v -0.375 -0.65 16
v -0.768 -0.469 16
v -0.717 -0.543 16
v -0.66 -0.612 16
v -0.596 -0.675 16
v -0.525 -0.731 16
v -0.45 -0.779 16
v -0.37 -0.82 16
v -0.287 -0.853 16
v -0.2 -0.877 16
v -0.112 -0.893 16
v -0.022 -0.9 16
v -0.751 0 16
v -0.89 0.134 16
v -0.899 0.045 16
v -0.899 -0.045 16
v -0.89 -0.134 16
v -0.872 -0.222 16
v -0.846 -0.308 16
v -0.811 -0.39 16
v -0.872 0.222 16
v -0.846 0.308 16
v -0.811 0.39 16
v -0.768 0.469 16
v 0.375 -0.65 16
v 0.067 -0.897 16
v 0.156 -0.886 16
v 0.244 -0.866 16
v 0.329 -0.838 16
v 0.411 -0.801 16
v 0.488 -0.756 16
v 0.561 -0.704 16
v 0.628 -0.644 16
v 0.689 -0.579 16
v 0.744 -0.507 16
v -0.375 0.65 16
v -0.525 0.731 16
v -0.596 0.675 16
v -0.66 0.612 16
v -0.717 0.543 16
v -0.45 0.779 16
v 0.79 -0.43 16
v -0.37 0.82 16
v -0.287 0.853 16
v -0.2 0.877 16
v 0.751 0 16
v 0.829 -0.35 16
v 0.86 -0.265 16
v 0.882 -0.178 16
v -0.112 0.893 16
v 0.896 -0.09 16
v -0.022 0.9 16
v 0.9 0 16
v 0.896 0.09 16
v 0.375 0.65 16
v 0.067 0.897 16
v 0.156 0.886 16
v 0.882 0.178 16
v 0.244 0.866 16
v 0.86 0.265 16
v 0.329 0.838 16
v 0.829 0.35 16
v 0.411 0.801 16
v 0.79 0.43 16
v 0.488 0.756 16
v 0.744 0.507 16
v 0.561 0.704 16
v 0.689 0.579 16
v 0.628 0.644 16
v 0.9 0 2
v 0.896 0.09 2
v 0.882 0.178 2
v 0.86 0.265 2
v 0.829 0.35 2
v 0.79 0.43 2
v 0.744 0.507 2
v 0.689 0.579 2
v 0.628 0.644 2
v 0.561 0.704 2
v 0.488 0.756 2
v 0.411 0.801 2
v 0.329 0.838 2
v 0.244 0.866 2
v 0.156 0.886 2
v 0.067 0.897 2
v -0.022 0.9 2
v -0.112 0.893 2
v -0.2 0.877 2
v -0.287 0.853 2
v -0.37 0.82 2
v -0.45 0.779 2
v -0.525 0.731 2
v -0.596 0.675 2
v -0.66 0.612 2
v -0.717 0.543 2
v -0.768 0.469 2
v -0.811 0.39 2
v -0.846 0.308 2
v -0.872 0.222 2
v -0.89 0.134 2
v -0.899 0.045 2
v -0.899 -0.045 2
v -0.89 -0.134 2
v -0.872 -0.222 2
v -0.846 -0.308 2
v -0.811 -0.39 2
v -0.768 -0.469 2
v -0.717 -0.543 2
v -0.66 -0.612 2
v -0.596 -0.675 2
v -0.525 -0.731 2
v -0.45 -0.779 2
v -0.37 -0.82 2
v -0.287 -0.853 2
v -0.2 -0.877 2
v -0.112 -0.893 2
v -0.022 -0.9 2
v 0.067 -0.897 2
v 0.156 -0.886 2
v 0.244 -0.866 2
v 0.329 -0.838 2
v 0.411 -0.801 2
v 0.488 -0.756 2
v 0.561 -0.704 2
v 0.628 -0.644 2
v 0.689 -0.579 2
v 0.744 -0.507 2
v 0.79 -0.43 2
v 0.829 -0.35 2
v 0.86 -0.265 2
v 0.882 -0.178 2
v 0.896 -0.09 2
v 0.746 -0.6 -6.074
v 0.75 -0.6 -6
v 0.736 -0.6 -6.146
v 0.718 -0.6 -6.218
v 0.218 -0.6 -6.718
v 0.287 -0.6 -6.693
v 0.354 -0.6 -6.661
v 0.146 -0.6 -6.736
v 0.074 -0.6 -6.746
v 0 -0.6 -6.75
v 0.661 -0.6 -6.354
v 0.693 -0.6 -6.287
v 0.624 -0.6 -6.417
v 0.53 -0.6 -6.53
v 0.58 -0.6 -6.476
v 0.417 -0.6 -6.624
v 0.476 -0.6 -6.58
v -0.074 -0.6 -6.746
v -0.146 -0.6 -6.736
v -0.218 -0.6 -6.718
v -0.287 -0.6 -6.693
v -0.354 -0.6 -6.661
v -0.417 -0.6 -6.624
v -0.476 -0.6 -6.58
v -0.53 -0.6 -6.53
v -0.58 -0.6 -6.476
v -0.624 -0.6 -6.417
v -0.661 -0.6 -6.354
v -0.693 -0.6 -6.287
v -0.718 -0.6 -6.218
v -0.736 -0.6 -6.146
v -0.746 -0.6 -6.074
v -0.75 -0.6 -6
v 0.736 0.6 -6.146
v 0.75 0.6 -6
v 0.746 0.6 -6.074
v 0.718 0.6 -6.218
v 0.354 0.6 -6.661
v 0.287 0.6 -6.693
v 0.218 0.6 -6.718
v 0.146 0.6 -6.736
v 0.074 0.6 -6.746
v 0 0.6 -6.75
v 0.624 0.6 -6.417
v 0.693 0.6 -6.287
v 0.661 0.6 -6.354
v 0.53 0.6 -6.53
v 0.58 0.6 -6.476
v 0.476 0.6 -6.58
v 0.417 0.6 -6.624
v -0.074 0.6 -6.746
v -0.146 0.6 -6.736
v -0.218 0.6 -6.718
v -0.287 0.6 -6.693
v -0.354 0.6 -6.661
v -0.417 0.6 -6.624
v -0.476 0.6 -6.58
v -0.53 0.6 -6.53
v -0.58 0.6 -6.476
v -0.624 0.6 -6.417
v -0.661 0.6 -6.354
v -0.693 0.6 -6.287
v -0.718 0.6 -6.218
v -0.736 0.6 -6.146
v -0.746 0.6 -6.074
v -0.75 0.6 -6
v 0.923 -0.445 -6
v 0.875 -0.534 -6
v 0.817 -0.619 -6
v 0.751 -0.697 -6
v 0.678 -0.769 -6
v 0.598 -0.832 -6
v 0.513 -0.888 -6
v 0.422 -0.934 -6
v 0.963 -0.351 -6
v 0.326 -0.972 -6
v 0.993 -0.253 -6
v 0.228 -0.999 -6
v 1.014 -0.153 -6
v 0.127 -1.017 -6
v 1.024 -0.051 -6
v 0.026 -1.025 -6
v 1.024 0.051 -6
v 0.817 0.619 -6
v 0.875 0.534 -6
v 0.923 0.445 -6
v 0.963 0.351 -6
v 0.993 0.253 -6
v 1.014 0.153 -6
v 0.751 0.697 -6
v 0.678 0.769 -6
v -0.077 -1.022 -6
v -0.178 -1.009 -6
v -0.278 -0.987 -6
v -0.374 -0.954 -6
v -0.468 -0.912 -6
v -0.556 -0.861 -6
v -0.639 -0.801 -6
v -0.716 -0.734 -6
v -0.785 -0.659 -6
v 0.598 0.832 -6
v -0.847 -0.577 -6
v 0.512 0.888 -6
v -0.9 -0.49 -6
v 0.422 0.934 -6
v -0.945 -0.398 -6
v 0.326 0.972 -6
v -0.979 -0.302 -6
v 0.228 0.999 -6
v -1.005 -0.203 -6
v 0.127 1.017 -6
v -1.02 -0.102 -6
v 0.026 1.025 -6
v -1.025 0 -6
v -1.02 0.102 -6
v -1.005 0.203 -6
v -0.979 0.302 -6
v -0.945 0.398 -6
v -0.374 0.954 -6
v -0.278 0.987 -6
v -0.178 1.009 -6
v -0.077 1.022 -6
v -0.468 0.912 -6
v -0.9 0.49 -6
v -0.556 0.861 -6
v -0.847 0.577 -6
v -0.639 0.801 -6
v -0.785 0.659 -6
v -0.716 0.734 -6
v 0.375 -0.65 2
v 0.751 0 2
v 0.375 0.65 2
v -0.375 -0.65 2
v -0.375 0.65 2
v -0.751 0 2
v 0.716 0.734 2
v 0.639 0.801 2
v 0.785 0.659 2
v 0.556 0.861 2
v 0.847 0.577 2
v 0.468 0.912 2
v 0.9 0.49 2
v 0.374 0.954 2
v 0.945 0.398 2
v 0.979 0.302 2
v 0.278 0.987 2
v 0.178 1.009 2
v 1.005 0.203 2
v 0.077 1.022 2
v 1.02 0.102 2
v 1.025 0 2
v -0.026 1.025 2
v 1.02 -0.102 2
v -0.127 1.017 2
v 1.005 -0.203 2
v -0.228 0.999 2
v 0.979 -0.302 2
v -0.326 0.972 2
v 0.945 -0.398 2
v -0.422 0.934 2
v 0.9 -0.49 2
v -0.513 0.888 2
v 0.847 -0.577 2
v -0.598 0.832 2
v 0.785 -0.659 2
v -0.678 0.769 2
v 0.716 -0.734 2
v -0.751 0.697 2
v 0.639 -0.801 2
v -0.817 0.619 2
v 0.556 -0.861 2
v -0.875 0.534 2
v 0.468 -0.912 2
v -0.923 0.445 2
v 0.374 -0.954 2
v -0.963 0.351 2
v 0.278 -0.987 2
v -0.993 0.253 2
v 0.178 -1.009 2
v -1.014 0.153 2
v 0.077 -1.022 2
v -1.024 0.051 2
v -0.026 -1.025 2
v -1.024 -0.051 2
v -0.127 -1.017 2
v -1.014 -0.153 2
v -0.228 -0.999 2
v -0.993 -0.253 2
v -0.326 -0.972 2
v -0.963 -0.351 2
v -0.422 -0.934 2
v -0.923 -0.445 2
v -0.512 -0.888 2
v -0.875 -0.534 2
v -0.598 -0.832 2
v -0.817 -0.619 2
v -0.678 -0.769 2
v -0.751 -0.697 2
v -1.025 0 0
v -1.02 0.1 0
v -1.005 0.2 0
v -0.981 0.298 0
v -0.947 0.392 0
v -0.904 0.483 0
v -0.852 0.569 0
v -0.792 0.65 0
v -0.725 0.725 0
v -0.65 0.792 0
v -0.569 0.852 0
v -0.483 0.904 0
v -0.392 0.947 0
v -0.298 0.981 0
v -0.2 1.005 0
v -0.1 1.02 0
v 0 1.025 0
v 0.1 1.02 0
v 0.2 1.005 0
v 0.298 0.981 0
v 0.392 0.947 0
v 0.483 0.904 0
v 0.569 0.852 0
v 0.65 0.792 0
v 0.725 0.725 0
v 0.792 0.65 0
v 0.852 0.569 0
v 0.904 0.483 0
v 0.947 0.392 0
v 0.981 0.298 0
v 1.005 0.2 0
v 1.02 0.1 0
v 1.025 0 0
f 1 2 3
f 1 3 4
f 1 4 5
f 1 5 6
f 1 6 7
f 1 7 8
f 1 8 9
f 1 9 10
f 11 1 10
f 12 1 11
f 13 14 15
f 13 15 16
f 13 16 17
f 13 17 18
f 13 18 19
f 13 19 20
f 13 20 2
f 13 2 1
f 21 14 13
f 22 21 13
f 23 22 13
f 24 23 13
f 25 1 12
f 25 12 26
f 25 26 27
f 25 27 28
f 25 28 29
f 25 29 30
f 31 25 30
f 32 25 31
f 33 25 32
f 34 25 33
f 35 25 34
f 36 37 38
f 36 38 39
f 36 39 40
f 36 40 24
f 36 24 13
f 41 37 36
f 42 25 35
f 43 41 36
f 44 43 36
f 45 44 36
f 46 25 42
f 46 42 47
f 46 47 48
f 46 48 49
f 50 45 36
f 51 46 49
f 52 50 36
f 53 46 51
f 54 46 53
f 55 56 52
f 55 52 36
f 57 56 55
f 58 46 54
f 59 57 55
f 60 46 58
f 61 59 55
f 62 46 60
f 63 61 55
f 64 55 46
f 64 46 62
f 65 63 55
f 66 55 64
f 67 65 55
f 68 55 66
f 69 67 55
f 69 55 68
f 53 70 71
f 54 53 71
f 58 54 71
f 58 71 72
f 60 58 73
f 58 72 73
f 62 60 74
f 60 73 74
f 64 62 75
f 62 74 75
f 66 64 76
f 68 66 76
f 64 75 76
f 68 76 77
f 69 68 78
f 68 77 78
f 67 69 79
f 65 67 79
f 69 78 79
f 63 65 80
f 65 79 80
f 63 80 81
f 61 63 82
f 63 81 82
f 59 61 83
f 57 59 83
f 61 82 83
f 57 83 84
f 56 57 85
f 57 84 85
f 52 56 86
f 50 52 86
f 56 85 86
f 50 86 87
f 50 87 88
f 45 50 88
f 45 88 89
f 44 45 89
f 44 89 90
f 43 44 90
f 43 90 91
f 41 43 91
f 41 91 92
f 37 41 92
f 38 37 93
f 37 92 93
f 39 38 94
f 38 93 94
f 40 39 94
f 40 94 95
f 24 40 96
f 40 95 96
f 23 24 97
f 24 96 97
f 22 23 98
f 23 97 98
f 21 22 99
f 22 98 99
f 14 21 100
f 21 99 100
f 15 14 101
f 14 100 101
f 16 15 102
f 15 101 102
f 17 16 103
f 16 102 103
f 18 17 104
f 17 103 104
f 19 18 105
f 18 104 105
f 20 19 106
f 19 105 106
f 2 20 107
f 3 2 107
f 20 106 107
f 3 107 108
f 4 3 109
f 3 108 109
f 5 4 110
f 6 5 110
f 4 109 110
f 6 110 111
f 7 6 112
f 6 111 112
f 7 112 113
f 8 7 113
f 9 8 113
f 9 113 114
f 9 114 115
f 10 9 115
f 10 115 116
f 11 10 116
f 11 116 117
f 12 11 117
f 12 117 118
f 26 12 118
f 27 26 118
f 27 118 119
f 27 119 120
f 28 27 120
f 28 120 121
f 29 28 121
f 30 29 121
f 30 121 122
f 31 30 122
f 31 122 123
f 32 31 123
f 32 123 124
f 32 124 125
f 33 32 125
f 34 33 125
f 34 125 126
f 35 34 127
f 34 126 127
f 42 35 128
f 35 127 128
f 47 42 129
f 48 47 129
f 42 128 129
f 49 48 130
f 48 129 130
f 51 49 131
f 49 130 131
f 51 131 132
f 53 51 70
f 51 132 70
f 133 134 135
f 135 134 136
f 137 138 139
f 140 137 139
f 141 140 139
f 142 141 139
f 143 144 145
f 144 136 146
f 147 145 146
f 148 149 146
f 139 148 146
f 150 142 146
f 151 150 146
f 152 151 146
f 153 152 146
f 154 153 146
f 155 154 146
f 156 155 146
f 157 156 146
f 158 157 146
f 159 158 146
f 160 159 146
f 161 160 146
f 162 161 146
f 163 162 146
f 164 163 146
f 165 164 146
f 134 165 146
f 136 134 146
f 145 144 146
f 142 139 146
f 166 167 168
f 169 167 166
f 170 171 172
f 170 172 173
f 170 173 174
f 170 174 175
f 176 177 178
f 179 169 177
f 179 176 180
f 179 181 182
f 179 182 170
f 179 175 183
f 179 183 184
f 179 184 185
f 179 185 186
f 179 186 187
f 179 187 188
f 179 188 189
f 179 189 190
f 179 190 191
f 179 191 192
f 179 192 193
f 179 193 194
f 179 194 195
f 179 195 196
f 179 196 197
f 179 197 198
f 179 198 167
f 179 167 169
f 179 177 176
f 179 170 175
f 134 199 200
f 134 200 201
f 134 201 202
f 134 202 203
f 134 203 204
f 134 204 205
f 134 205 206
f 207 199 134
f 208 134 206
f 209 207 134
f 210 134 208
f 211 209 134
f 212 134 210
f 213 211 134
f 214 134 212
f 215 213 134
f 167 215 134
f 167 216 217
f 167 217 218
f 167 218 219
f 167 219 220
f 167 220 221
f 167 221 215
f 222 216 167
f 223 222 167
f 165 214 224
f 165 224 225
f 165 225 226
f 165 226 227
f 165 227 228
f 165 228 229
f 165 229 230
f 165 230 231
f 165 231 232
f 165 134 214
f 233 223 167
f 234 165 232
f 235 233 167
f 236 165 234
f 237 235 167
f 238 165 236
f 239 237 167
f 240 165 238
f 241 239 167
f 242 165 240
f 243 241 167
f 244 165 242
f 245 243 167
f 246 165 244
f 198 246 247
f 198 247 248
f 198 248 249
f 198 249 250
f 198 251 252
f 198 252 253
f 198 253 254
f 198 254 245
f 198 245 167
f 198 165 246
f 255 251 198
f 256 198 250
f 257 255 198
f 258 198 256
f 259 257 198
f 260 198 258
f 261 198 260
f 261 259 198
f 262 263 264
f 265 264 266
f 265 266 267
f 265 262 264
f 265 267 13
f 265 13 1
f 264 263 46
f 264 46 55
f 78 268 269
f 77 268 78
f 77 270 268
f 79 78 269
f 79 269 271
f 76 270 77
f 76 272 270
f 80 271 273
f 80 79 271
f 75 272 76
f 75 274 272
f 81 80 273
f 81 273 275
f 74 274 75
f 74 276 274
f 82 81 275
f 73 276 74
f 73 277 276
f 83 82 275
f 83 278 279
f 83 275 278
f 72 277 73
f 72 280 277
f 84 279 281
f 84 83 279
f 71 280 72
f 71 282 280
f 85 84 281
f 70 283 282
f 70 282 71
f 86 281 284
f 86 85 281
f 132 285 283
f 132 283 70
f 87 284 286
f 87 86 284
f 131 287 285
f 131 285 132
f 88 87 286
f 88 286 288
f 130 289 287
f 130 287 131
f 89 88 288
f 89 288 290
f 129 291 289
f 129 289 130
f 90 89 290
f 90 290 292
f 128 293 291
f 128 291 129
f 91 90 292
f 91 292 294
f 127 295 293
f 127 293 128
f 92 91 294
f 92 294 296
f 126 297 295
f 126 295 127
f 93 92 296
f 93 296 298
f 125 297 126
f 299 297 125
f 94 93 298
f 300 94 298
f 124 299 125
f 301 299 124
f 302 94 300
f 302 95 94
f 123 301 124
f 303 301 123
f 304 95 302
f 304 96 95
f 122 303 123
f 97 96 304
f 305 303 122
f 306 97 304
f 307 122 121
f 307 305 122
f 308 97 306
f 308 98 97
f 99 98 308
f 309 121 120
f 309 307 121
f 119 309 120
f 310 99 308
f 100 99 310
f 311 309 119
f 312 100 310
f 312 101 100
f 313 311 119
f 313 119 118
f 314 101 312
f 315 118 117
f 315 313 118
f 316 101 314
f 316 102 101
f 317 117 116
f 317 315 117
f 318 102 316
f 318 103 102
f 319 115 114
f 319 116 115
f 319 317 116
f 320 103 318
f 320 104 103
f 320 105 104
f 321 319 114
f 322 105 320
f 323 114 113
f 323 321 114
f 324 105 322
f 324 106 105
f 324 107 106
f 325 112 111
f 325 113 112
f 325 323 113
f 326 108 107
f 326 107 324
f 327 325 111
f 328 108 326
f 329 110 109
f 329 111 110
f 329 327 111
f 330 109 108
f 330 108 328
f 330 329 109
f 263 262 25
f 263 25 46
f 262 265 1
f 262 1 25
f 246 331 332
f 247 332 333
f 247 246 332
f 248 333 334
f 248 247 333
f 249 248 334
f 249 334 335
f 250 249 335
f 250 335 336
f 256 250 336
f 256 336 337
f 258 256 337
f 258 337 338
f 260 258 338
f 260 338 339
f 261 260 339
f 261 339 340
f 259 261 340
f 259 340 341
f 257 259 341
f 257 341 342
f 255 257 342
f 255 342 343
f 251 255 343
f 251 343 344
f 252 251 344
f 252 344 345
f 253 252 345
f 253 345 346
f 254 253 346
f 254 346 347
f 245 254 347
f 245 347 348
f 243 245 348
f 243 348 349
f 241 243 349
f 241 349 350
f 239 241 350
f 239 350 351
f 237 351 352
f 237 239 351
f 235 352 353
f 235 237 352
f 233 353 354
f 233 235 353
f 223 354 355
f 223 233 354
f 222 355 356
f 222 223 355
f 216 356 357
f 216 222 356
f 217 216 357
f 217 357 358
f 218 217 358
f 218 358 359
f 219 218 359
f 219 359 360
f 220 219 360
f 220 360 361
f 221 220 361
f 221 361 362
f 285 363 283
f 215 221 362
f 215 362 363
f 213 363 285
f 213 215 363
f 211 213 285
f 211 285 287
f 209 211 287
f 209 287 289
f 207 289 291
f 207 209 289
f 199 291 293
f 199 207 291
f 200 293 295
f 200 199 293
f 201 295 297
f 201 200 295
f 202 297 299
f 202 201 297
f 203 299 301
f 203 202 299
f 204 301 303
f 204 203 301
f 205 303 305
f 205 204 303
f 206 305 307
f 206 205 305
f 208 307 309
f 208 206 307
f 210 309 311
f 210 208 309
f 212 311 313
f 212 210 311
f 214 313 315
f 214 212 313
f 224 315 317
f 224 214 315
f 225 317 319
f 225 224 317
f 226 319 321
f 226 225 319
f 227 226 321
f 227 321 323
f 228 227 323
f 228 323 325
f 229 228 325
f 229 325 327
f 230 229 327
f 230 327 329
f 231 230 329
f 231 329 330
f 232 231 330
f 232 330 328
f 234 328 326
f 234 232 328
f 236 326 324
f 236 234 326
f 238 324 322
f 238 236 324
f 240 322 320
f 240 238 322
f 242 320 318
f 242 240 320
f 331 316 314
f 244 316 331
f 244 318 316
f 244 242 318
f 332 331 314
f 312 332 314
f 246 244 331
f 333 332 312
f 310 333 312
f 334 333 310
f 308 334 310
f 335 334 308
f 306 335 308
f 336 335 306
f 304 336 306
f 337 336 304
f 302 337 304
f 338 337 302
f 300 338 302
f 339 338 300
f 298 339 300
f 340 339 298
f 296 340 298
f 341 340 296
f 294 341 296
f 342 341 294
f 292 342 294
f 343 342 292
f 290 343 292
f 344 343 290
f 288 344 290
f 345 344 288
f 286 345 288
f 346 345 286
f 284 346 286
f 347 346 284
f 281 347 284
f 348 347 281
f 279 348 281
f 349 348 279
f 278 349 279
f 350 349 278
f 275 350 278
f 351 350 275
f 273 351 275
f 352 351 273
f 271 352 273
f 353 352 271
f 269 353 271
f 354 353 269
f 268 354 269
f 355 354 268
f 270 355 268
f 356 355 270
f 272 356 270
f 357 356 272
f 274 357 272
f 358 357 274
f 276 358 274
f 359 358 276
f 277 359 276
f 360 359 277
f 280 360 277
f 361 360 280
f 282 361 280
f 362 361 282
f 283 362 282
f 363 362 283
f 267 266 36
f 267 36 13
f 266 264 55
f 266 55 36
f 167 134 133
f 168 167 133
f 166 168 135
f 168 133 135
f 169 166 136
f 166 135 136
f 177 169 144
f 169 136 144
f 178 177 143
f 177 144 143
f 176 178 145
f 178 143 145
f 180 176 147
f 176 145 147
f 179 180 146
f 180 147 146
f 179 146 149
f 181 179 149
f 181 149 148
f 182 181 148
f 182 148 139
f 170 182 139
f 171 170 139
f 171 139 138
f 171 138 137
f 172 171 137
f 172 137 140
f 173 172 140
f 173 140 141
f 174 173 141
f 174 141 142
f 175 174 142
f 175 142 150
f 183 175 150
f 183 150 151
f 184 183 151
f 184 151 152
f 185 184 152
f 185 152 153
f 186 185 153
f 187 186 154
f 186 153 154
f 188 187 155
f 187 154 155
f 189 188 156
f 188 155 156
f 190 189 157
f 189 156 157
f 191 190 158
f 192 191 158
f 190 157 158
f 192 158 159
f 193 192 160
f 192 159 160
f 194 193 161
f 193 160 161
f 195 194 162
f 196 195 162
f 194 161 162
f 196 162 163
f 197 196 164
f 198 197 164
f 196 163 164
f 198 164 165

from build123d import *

# Parameters (mm, degrees)
SKETCH1_R                = 1.025
BOSS_EXTRUDE1_DEPTH      = 12
CUT_EXTRUDE1_DEPTH       = 7
BOSS_EXTRUDE2_START      = 4
SKETCH3_R                = 1.025
BOSS_EXTRUDE2_DEPTH      = 4
SKETCH6_R                = 1.025
BOSS_EXTRUDE5_DEPTH      = 7
BOSS_EXTRUDE6_START      = 2
SKETCH7_R                = 1.025
BOSS_EXTRUDE6_DEPTH      = 2
BOSS_EXTRUDE8_DEPTH      = 0.6
BOSS_EXTRUDE8_DEPTH_BACK = 0.6
CUT_EXTRUDE3_START       = -17
SKETCH9_R                = 1.025
CUT_EXTRUDE3_DEPTH       = 17
SKETCH10_R               = 0.9
BOSS_EXTRUDE12_DEPTH     = 14


with BuildPart() as part:
    # Sketch1 → Boss-Extrude1 (new body)
    with BuildSketch(Plane.XY):
        Circle(SKETCH1_R)
    extrude(amount=BOSS_EXTRUDE1_DEPTH)

    # Sketch2 → Cut-Extrude1 (cut)
    with BuildSketch(Plane.XY.offset(12)):
        Polygon((0.866025404, 0), (0.433012702, 0.75), (-0.433012702, 0.75), (-0.866025404, 0), (-0.433012702, -0.75), (0.433012702, -0.75), align=None)
    extrude(amount=-CUT_EXTRUDE1_DEPTH, mode=Mode.SUBTRACT)

    # Sketch3 → Boss-Extrude2 (add)
    with BuildSketch(Plane(origin=(0, 0, 0), x_dir=(-1, 0, 0), z_dir=(0, 0, -1)).offset(BOSS_EXTRUDE2_START)):
        Circle(SKETCH3_R)
    extrude(amount=-BOSS_EXTRUDE2_DEPTH)

    # Sketch6 → Boss-Extrude5 (add)
    with BuildSketch(Plane.XY.offset(12)):
        with Locations(Location((0, 0, 0), (0, 0, 180))):
            Circle(SKETCH6_R)
        Polygon((0.866025404, 0), (0.433012702, 0.75), (-0.433012702, 0.75), (-0.866025404, 0), (-0.433012702, -0.75), (0.433012702, -0.75), align=None, mode=Mode.SUBTRACT)
    extrude(amount=BOSS_EXTRUDE5_DEPTH)

    # Sketch7 → Boss-Extrude6 (add)
    with BuildSketch(Plane(origin=(0, 0, -4), x_dir=(-1, 0, 0), z_dir=(0, 0, -1)).offset(BOSS_EXTRUDE6_START)):
        Circle(SKETCH7_R)
    extrude(amount=-BOSS_EXTRUDE6_DEPTH)

    # Sketch8 → Boss-Extrude8 (add, two sides: drawn at the far end of the back side and taken through both)
    with BuildSketch(Plane(origin=(0, 0, 0), x_dir=(1, 0, 0), z_dir=(0, 1, 0)).offset(-BOSS_EXTRUDE8_DEPTH_BACK)):
        with BuildLine():
            ThreePointArc((0.75, 6), (0, 6.75), (-0.75, 6))
            Line((-0.75, 6), (0.75, 6))
        make_face()
        with BuildLine():
            Line((0.75, 6), (-0.75, 6))
            ThreePointArc((-0.75, 6), (0, 5.25), (0.75, 6))
        make_face()
    extrude(amount=BOSS_EXTRUDE8_DEPTH + BOSS_EXTRUDE8_DEPTH_BACK)

    # Sketch9 → Cut-Extrude3 (cut)
    with BuildSketch(Plane.XY.offset(19).offset(CUT_EXTRUDE3_START)):
        with Locations(Location((0, 0, 0), (0, 0, 180))):
            Circle(SKETCH9_R)
    extrude(amount=CUT_EXTRUDE3_DEPTH, mode=Mode.SUBTRACT)

    # Sketch10 → Boss-Extrude12 (add)
    with BuildSketch(Plane.XY.offset(2)):
        Circle(SKETCH10_R)
        Polygon((0.75055535, 0), (0.375277675, 0.65), (-0.375277675, 0.65), (-0.75055535, 0), (-0.375277675, -0.65), (0.375277675, -0.65), align=None, mode=Mode.SUBTRACT)
    extrude(amount=BOSS_EXTRUDE12_DEPTH)


solid = part.part
